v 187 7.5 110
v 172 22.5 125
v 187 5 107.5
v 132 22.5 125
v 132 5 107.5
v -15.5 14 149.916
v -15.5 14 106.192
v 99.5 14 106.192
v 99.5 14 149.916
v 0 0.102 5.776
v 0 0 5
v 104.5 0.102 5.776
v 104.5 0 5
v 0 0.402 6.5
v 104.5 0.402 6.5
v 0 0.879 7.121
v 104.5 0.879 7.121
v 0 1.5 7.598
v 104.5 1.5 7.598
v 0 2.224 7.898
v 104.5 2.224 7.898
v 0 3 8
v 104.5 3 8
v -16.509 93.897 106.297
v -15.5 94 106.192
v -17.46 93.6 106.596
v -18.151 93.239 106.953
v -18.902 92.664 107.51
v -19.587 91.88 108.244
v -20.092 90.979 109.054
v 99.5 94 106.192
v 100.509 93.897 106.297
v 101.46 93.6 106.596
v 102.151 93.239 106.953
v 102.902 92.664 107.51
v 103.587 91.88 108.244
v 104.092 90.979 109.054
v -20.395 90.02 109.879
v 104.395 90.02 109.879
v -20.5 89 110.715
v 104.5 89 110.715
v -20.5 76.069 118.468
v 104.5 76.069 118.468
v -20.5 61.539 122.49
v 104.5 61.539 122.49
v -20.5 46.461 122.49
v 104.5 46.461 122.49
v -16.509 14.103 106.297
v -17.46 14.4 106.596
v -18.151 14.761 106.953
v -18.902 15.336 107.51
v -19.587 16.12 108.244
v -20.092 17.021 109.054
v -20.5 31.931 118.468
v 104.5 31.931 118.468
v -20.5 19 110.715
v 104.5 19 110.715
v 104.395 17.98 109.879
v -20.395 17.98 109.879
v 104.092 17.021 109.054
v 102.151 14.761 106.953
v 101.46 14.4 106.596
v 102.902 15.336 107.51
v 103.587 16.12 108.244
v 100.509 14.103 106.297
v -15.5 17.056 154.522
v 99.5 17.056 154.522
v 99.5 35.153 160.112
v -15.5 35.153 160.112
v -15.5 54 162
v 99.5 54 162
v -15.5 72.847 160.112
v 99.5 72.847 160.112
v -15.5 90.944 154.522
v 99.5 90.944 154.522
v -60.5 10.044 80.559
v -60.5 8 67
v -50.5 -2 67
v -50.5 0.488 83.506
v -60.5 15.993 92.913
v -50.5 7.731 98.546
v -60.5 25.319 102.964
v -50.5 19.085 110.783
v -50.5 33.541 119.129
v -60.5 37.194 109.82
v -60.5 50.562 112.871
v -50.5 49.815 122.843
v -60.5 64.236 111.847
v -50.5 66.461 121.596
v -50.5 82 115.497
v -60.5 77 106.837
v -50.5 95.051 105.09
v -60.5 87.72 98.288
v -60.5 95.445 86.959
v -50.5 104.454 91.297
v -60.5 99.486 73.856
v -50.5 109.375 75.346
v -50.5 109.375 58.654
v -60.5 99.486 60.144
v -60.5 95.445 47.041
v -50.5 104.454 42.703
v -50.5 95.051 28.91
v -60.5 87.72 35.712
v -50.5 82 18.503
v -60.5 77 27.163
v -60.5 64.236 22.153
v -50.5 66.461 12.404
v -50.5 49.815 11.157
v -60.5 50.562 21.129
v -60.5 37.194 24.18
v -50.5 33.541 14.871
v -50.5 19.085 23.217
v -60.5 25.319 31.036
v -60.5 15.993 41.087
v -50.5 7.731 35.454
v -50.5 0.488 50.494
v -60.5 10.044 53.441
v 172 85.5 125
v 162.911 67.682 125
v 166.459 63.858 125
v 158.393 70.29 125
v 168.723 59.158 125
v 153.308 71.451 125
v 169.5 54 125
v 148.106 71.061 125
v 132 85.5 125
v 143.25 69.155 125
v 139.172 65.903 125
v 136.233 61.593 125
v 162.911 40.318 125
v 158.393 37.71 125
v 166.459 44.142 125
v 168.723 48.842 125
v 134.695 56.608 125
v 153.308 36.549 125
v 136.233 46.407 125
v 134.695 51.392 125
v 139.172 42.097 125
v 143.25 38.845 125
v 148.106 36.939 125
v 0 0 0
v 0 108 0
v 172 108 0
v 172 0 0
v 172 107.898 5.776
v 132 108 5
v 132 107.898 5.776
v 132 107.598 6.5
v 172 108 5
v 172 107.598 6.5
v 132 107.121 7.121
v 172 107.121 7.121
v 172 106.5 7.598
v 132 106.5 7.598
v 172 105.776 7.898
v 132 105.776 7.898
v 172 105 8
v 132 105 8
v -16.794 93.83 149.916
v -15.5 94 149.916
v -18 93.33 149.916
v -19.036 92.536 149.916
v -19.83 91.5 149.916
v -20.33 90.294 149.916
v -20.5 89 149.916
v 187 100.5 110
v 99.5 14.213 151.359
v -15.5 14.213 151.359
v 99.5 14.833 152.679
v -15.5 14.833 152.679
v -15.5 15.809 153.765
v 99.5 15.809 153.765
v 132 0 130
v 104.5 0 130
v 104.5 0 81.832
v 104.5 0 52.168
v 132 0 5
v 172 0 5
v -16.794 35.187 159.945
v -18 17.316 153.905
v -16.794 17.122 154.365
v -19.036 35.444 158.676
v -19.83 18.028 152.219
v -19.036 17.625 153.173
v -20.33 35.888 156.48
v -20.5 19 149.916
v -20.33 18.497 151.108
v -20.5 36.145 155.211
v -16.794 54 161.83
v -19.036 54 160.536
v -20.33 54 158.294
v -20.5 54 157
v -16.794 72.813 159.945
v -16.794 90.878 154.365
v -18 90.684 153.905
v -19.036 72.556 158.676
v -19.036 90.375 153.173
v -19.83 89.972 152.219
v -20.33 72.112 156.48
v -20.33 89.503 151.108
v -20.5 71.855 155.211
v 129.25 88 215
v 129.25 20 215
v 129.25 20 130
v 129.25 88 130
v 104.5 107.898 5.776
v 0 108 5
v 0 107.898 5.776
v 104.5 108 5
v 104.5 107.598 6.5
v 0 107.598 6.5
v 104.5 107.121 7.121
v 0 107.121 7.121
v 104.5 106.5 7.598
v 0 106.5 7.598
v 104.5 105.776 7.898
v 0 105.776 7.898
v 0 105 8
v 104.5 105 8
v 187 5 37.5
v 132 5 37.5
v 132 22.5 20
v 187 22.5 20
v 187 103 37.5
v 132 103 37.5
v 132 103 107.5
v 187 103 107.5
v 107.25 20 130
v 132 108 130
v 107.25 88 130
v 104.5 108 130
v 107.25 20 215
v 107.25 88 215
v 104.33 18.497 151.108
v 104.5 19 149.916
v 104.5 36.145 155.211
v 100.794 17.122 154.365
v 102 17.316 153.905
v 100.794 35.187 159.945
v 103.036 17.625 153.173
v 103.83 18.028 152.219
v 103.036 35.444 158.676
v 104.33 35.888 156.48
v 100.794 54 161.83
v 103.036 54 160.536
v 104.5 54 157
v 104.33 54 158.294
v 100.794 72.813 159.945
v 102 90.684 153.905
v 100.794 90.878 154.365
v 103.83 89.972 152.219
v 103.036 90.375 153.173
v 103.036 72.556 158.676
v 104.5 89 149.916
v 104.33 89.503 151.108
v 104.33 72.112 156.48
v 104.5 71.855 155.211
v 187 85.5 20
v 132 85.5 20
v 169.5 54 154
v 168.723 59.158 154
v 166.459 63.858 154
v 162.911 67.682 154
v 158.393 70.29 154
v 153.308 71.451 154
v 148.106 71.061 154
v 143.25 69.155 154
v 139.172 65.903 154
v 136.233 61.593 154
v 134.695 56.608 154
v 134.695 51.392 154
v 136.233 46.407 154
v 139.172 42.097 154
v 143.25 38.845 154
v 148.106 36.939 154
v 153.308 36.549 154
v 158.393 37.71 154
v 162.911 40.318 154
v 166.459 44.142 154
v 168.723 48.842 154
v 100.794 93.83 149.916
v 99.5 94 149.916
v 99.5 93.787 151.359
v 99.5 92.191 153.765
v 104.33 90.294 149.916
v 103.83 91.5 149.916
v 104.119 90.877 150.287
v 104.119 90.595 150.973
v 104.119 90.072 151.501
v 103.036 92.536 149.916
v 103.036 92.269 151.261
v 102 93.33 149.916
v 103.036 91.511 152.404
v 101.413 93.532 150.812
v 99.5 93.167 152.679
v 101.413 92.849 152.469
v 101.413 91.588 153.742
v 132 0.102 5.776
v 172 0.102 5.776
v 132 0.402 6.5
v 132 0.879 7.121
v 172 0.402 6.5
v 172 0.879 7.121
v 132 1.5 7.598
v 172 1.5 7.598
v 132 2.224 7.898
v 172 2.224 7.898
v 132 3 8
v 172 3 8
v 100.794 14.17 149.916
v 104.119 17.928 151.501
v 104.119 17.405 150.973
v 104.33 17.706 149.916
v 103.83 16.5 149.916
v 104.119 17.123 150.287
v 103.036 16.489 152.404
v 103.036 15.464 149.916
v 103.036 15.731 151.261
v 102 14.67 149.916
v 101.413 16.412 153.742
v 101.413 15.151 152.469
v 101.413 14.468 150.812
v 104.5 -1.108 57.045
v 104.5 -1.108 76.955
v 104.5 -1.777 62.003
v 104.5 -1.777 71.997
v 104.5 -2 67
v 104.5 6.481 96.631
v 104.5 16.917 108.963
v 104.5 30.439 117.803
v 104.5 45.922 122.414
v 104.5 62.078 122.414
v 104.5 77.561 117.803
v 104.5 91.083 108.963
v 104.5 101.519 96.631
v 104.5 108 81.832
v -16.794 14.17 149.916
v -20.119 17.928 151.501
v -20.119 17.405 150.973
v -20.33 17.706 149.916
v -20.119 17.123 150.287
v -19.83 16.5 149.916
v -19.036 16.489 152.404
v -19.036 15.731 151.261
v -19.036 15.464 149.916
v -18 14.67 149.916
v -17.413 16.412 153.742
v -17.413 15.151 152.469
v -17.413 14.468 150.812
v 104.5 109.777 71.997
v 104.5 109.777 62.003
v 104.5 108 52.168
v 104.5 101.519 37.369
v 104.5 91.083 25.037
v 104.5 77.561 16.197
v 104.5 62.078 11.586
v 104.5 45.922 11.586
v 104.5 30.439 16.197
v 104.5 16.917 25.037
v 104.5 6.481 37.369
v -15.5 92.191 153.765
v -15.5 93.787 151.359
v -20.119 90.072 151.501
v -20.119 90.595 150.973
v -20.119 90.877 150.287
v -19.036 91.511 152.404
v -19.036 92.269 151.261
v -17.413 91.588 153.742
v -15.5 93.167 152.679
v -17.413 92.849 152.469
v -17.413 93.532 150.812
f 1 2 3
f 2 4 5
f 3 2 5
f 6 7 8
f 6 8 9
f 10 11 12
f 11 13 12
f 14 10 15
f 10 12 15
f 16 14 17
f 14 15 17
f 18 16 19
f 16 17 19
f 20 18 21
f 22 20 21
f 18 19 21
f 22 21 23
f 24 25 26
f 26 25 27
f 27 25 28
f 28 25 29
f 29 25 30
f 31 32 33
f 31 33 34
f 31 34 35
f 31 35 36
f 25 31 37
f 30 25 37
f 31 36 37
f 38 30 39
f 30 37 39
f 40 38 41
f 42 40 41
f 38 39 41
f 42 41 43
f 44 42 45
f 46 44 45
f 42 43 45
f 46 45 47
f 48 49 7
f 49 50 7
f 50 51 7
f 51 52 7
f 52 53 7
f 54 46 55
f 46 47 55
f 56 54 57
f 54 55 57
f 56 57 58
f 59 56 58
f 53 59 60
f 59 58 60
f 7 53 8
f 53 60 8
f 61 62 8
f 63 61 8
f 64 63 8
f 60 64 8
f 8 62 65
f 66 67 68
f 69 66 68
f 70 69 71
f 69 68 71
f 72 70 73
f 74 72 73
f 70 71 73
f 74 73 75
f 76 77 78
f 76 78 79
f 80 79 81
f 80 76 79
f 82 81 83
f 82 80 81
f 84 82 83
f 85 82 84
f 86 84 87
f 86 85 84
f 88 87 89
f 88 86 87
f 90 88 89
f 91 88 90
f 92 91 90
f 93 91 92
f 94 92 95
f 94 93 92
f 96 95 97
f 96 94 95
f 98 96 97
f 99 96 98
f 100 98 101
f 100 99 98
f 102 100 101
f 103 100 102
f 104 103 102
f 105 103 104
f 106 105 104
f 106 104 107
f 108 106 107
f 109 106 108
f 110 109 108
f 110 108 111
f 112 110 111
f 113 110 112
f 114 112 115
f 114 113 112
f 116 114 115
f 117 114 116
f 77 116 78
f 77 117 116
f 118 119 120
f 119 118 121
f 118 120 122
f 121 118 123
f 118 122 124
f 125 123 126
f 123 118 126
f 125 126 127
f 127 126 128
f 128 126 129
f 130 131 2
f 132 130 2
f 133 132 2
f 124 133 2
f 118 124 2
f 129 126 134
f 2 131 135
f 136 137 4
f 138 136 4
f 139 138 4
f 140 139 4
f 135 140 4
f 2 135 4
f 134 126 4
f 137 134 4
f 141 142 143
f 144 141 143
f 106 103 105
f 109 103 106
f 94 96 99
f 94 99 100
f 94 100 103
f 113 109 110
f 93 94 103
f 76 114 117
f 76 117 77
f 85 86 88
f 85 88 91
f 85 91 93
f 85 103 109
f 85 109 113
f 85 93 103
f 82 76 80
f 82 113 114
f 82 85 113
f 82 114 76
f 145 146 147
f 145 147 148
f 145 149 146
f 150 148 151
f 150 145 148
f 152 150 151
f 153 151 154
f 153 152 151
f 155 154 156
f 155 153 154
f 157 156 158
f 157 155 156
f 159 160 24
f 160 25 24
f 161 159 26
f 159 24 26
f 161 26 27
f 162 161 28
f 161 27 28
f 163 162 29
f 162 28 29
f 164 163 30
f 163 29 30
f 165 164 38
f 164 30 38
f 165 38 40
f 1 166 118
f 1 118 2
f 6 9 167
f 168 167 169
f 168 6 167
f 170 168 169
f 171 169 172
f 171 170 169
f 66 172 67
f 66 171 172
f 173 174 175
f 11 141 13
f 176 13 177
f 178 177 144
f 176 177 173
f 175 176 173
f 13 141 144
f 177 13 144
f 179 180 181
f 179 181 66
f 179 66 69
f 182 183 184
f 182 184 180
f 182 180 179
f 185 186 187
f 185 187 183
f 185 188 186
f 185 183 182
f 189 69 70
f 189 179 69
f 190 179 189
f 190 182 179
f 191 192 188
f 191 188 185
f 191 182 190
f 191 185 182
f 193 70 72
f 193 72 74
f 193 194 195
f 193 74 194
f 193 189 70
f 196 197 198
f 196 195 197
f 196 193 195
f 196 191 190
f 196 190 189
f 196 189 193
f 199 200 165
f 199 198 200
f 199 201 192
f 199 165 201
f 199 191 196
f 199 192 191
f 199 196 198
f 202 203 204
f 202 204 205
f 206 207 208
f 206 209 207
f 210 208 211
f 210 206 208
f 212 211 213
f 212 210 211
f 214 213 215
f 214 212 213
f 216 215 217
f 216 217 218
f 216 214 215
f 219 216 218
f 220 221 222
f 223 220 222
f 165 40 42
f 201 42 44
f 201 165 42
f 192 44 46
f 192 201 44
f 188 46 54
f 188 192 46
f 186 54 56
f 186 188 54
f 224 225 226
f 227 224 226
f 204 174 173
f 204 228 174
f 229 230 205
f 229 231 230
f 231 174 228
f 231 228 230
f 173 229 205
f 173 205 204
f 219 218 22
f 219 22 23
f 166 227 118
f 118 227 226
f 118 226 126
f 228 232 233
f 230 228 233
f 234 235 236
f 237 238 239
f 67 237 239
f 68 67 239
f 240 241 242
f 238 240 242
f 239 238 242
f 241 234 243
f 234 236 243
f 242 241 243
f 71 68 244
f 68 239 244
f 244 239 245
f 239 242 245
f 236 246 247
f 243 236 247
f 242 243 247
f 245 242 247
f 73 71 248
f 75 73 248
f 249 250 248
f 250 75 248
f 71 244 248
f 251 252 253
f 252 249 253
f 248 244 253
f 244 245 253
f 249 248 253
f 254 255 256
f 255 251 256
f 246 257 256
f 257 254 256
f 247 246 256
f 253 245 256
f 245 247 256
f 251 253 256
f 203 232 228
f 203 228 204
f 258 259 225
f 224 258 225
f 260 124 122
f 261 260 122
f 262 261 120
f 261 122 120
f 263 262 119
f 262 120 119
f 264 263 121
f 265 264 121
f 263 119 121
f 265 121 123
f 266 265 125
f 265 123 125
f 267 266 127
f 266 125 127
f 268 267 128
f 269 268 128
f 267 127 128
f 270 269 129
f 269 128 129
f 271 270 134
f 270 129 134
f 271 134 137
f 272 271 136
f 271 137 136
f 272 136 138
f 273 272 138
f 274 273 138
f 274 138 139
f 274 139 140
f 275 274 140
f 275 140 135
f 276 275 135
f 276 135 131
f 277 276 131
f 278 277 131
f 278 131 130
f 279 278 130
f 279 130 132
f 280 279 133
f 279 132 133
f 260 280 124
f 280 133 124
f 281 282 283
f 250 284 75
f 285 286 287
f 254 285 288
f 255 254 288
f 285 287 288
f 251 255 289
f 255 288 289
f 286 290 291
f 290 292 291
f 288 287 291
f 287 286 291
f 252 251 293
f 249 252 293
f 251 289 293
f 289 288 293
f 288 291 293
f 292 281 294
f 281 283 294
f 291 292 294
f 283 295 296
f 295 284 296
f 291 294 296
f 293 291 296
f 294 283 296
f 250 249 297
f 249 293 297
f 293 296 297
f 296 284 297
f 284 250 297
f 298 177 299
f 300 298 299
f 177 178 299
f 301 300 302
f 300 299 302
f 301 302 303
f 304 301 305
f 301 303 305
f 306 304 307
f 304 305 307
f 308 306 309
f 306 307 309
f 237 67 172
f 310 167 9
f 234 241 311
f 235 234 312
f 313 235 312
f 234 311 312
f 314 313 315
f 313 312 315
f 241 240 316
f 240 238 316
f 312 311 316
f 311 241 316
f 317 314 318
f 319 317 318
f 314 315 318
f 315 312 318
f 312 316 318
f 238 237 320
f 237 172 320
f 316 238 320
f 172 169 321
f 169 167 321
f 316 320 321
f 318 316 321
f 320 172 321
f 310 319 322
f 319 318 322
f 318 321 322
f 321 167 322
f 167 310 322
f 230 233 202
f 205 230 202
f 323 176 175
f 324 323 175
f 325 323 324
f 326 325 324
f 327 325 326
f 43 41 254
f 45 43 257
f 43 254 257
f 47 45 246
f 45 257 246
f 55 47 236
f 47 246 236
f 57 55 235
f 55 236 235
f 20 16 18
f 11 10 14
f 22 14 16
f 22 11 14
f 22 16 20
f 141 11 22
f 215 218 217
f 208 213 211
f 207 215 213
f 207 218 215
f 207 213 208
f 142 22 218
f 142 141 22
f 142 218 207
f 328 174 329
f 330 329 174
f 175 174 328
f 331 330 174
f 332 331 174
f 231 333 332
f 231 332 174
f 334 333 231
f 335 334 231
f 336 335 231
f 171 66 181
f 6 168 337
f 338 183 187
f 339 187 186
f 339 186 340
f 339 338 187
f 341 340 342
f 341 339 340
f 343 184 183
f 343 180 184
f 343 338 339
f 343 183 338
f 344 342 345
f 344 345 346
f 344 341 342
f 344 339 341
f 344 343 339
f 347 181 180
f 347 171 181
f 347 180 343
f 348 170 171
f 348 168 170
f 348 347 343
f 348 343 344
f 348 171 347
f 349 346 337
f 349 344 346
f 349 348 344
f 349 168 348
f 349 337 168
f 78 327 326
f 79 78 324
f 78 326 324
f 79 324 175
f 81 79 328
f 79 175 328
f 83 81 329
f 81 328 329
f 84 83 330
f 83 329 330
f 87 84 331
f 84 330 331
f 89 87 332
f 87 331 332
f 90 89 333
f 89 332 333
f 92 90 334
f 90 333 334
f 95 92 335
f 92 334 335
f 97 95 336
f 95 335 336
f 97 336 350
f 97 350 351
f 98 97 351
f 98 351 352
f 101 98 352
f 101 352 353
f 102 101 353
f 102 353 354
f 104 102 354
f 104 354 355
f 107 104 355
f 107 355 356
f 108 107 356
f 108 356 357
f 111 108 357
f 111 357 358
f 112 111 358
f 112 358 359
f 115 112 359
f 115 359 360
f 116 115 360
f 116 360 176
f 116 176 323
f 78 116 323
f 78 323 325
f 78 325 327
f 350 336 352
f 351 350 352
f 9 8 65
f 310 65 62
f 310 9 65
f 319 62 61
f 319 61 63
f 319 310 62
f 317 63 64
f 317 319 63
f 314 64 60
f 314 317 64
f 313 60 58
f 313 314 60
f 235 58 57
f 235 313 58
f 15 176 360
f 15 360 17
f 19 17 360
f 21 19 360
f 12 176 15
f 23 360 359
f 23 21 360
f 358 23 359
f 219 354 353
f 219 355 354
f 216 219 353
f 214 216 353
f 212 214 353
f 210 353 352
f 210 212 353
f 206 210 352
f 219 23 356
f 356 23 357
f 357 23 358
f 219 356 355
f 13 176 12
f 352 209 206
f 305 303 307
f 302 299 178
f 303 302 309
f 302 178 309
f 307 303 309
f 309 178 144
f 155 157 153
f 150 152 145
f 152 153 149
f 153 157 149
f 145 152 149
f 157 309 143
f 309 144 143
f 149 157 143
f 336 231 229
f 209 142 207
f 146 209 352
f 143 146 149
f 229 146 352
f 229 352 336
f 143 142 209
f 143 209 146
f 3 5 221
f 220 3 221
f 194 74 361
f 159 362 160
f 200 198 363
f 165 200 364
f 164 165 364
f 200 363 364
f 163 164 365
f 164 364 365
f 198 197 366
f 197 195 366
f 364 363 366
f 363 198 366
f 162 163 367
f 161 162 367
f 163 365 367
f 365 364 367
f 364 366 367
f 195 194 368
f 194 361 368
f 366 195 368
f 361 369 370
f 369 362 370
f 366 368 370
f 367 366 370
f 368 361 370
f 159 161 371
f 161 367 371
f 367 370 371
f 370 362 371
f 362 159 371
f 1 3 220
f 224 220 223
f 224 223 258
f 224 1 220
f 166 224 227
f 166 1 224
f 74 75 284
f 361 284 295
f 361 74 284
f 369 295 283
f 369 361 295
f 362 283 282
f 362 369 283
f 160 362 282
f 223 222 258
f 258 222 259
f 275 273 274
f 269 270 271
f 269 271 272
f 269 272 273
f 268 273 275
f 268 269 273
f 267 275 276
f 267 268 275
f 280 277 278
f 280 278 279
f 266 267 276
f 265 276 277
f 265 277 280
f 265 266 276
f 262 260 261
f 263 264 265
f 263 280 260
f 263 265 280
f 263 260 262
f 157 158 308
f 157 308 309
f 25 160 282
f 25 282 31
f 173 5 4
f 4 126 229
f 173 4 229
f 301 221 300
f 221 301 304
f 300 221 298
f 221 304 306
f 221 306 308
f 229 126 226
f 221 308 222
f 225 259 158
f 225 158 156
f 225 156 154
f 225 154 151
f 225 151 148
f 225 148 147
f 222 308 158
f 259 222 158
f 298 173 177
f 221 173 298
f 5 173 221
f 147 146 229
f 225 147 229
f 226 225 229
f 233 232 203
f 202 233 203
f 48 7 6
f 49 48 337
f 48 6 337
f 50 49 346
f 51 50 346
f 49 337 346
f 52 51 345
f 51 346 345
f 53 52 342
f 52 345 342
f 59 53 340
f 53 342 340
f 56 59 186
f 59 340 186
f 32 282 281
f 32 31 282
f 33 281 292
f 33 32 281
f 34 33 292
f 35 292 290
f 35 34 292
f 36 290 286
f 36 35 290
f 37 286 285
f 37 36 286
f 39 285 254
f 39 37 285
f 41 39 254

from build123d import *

# Parameters (mm, degrees)
F0_W      = 172
F0_H      = 108
F1_DEPTH  = 8
F2_W      = 27.5
F2_H      = 108
F3_DEPTH  = 122
F4_R      = 3
F6_DEPTH  = 55
F7_SIZE   = 15
F8_R      = 17.5
F9_DEPTH  = 29
F10_R     = 56
F11_DEPTH = 165
F12_SIZE  = 10
F14_DEPTH = 125
F15_R     = 5
F16_W     = 22
F16_H     = 68
F17_DEPTH = 85


with BuildPart() as f1:
    # F0 (on Top) → F1 (new body)
    with BuildSketch(Plane.XY):
        with Locations((86, 54)):
            Rectangle(F0_W, F0_H)
    extrude(amount=F1_DEPTH)

    # F2 (on face) → F3 (join)
    with BuildSketch(Plane.XY.offset(8)):
        with Locations((118.25, 54)):
            Rectangle(F2_W, F2_H)
    extrude(amount=F3_DEPTH)

    # F4
    f4_edges = [f1.edges().sort_by_distance(p)[0] for p in [
        (52.25, 0, 8),
        (52.25, 108, 8),
        (152, 108, 8),
        (152, 0, 8),
    ]]
    fillet(f4_edges, radius=F4_R)

    # F5 (on face) → F6 (join)
    with BuildSketch(Plane.YZ.offset(132)):
        Polygon((22.5, 20), (85.5, 20), (103, 37.5), (103, 107.5), (85.5, 125), (22.5, 125), (5, 107.5), (5, 37.5), align=None)
    extrude(amount=F6_DEPTH)

    # F7
    f7_edges = [f1.edges().sort_by_distance(p)[0] for p in [
        (187, 54, 125),
    ]]
    chamfer(f7_edges, length=F7_SIZE)

    # F8 (on face) → F9 (join)
    with BuildSketch(Plane.XY.offset(125)):
        with Locations((152, 54)):
            Circle(F8_R)
    extrude(amount=F9_DEPTH)

    # F10 (on face) → F11 (join)
    with BuildSketch(Plane(origin=(104.5, 0, 0), x_dir=(0, -1, 0), z_dir=(-1, 0, 0))):
        with Locations((-54, 67)):
            Circle(F10_R)
    extrude(amount=F11_DEPTH)

    # F12
    f12_edges = [f1.edges().sort_by_distance(p)[0] for p in [
        (-60.5, 110, 67),
    ]]
    chamfer(f12_edges, length=F12_SIZE)

    # F16 (on face) → F17 (join)
    with BuildSketch(Plane.XY.offset(130)):
        with Locations((118.25, 54)):
            Rectangle(F16_W, F16_H)
    extrude(amount=F17_DEPTH)


with BuildPart() as f14:
    # F13 (on face) → F14 (new body)
    with BuildSketch(Plane(origin=(104.5, 0, 0), x_dir=(0, -1, 0), z_dir=(-1, 0, 0))):
        with BuildLine():
            Line((-14, 106.1918358845), (-14, 153.1684396981))
            ThreePointArc((-14, 153.1684396981), (-54, 162), (-94, 153.1684396981))
            Line((-94, 153.1684396981), (-94, 106.1918358845))
            ThreePointArc((-94, 106.1918358845), (-54, 123), (-14, 106.1918358845))
        make_face()
    extrude(amount=F14_DEPTH)

    # F15
    f15_edges = [f14.edges().sort_by_distance(p)[0] for p in [
        (42, 14, 153.16844),
        (-20.5, 54, 162),
        (-20.5, 14, 129.680138),
        (-20.5, 94, 129.680138),
        (104.5, 54, 162),
        (42, 94, 153.16844),
        (104.5, 14, 129.680138),
        (104.5, 94, 129.680138),
    ]]
    fillet(f15_edges, radius=F15_R)


solid = Compound([f1.part, f14.part])
